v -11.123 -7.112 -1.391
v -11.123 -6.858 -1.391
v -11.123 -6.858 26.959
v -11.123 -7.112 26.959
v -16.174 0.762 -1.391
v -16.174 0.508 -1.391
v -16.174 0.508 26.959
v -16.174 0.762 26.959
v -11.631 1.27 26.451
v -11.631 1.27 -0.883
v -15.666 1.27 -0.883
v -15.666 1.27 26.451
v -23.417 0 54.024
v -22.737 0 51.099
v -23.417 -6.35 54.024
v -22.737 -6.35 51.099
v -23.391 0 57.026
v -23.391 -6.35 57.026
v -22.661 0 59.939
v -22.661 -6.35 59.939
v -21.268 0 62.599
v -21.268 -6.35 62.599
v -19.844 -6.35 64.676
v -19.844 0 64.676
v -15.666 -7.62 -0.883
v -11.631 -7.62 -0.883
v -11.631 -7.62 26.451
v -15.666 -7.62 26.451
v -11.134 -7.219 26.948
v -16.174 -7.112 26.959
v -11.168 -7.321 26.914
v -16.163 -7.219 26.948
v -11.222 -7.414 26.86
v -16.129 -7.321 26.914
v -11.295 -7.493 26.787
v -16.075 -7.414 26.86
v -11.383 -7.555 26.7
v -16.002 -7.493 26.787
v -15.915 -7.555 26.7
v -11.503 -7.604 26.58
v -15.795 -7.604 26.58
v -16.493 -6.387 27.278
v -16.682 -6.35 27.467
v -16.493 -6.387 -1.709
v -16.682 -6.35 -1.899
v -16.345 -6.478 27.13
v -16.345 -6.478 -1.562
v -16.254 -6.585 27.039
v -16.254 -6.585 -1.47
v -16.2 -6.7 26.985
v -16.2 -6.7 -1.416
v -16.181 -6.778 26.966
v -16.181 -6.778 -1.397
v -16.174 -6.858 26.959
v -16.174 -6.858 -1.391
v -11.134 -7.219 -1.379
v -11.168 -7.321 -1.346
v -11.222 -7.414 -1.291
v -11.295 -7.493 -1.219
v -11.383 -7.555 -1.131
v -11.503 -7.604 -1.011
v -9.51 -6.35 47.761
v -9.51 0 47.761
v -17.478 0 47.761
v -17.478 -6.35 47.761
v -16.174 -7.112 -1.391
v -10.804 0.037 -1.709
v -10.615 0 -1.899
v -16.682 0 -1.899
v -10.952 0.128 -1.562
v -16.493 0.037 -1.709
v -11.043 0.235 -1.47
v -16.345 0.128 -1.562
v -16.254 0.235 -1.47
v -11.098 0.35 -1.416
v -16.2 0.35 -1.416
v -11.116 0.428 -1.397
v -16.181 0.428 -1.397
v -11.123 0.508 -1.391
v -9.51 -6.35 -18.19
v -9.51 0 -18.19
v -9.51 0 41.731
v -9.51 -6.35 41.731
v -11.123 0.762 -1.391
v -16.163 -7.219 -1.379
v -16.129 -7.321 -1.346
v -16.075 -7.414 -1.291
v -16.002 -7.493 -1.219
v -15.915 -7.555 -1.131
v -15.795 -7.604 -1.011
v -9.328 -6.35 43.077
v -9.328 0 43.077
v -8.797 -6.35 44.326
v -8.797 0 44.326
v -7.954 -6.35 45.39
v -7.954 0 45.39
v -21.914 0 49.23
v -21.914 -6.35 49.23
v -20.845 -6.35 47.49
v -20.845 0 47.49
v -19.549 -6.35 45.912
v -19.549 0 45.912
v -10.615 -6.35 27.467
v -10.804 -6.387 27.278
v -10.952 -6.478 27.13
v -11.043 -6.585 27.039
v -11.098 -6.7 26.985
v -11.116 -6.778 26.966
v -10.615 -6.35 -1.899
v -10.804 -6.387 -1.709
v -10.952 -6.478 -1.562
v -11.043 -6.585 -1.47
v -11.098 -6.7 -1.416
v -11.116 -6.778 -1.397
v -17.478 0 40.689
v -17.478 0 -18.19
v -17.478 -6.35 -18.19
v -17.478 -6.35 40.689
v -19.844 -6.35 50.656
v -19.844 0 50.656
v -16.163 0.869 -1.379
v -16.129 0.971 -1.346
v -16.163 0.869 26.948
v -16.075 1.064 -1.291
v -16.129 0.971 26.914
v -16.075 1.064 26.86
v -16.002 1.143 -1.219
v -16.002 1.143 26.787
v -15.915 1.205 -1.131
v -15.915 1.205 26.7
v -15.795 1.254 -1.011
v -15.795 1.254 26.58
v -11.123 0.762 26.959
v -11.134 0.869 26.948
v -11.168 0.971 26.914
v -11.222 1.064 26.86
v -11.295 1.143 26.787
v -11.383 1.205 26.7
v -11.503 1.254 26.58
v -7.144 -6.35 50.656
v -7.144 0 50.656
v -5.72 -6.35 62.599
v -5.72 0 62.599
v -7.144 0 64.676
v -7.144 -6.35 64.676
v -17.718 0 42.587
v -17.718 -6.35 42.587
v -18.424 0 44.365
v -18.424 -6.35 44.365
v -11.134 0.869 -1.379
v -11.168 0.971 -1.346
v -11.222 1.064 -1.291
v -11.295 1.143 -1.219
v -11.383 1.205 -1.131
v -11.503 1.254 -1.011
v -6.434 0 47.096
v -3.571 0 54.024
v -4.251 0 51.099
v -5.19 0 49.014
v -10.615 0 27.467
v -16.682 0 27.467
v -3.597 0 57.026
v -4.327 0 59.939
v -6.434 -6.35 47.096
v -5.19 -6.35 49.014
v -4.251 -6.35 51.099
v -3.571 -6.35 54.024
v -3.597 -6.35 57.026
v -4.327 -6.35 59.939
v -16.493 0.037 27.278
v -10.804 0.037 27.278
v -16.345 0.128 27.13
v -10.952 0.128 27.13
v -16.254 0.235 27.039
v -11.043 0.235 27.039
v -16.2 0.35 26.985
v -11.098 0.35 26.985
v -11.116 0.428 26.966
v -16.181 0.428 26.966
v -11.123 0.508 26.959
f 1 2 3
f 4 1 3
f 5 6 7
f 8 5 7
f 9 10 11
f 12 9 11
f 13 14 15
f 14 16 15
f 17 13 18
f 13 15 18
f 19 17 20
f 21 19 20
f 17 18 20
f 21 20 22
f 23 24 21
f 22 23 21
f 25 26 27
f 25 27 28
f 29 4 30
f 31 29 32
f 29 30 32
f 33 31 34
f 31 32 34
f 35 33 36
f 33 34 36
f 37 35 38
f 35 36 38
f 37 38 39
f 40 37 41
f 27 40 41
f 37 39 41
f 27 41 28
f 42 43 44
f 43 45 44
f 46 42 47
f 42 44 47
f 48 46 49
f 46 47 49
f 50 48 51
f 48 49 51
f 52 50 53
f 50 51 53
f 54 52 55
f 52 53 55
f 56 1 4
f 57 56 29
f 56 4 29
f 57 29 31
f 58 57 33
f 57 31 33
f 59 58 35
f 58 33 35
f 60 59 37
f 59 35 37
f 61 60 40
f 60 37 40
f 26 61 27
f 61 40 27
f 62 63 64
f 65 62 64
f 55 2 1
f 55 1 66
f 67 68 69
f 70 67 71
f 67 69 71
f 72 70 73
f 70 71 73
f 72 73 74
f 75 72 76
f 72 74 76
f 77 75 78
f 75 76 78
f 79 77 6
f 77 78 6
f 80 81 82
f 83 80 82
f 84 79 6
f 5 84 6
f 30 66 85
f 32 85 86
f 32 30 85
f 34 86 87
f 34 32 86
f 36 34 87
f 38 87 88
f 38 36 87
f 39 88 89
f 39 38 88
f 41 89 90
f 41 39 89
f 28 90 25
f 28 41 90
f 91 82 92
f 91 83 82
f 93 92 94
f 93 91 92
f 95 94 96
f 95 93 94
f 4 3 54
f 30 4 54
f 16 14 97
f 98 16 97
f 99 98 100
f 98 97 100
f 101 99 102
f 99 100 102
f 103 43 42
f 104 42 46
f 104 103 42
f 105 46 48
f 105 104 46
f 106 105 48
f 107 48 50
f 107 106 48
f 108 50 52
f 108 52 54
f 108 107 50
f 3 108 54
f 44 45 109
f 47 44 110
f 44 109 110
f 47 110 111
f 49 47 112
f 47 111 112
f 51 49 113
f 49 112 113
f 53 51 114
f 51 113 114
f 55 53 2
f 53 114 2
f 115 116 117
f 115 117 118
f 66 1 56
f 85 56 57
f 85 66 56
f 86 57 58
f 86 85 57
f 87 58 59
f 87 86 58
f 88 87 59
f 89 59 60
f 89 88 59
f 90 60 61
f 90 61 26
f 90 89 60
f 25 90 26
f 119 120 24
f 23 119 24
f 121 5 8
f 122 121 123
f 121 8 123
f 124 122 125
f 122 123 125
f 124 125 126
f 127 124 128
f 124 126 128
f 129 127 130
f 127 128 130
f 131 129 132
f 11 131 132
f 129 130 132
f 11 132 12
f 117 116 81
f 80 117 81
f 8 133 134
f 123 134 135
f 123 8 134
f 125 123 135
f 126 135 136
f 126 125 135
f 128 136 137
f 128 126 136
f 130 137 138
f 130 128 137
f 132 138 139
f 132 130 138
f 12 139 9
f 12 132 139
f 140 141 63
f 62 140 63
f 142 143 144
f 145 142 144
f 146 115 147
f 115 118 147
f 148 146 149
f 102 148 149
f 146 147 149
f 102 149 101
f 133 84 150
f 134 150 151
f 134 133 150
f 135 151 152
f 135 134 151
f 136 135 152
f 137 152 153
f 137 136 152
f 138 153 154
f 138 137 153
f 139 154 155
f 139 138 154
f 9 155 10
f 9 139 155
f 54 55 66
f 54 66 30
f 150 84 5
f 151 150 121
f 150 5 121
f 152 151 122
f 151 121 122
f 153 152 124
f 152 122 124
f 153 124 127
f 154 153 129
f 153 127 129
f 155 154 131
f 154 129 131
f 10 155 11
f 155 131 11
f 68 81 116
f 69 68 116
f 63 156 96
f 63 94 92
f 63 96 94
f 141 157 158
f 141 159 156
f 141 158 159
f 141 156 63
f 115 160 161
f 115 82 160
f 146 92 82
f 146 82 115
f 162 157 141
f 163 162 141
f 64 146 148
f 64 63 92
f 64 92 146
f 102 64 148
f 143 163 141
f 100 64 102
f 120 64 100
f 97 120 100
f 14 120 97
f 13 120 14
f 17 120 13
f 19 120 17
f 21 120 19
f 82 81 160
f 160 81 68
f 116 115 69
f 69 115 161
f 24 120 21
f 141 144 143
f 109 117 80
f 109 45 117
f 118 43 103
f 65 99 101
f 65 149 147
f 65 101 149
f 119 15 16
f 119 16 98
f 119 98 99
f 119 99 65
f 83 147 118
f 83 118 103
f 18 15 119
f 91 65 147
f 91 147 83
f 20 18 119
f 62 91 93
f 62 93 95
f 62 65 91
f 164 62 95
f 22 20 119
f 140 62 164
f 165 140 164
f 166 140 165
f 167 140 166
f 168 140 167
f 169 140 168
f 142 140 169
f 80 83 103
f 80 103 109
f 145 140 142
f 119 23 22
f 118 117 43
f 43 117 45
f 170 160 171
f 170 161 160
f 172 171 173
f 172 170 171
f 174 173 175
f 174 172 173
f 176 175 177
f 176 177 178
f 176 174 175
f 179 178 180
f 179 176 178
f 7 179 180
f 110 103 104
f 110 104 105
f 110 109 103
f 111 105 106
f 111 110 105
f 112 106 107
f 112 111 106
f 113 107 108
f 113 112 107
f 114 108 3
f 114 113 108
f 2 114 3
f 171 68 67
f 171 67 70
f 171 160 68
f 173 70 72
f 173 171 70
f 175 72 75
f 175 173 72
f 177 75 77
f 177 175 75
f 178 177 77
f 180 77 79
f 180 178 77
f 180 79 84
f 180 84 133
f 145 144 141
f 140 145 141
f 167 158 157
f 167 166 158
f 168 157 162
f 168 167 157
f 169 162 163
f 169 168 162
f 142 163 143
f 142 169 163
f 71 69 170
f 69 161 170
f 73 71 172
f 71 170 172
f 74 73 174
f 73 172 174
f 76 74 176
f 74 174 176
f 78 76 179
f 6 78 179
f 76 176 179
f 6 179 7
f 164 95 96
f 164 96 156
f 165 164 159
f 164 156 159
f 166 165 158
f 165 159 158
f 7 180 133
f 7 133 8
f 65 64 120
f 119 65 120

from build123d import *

# Parameters (mm, degrees)
F0_W          = 7.9684891073
F0_H          = 62.2722776352
F1_DEPTH      = 6.35
F2_R          = 7.62
F3_R          = 12.7
F4_W          = 5.0514815375
F4_H          = 28.3501516096
F5_DEPTH      = 7.62
F5_DEPTH_BACK = 1.27
F6_R          = 0.508
F7_R          = 0.508
F8_R          = 0.508
F9_R          = 5.08


with BuildPart() as f1:
    # F0 (on Front) → F1 (new body)
    with BuildSketch(Plane.XZ):
        with Locations((-13.4939518757, 12.9458873377)):
            Rectangle(F0_W, F0_H)
        with BuildLine():
            ThreePointArc((-23.2001595007, 59.7813798143), (-22.7239205368, 51.0625328759), (-17.4781964294, 44.0820261553))
            Line((-17.4781964294, 44.0820261553), (-9.5097073221, 44.0820261553))
            ThreePointArc((-9.5097073221, 44.0820261553), (-4.2639832147, 51.0625328759), (-3.7877442507, 59.7813798143))
            Line((-3.7877442507, 59.7813798143), (-7.1439518757, 59.7813798143))
            Line((-7.1439518757, 59.7813798143), (-7.1439518757, 50.6561658404))
            Line((-7.1439518757, 50.6561658404), (-9.5097073221, 47.7606636927))
            Line((-9.5097073221, 47.7606636927), (-17.4781964294, 47.7606636927))
            Line((-17.4781964294, 47.7606636927), (-19.8439518757, 50.6561658404))
            Line((-19.8439518757, 50.6561658404), (-19.8439518757, 59.7813798143))
            Line((-19.8439518757, 59.7813798143), (-23.2001595007, 59.7813798143))
        make_face()
        Polygon((-19.8439518757, 64.6756440401), (-23.2001595007, 59.7813798143), (-19.8439518757, 59.7813798143), align=None)
        Polygon((-7.1439518757, 59.7813798143), (-3.7877442507, 59.7813798143), (-7.1439518757, 64.6756440401), align=None)
    extrude(amount=F1_DEPTH)

    # F2
    f2_edges = [f1.edges().sort_by_distance(p)[0] for p in [
        (-17.478196, -3.175, 44.082026),
    ]]
    fillet(f2_edges, radius=F2_R)

    # F3
    f3_edges = [f1.edges().sort_by_distance(p)[0] for p in [
        (-3.787744, -3.175, 59.78138),
        (-23.20016, -3.175, 59.78138),
    ]]
    fillet(f3_edges, radius=F3_R)

    # F4 (on face) → F5 (join, two sides)
    with BuildSketch(Plane(origin=(0, 0, 0), x_dir=(-1, 0, 0), z_dir=(0, 1, 0))) as f5_sk:
        with Locations((13.6485905387, 12.7843844239)):
            Rectangle(F4_W, F4_H)
    extrude(amount=-F5_DEPTH)
    extrude(f5_sk.sketch, amount=F5_DEPTH_BACK)

    # F6
    f6_edges = [f1.edges().sort_by_distance(p)[0] for p in [
        (-11.12285, 0, 12.784384),
        (-13.648591, 0, -1.390691),
        (-13.648591, 0, 26.95946),
        (-16.174331, 0, 12.784384),
    ]]
    fillet(f6_edges, radius=F6_R)

    # F7
    f7_edges = [f1.edges().sort_by_distance(p)[0] for p in [
        (-11.12285, 1.27, 12.784384),
        (-13.648591, 1.27, -1.390691),
        (-16.174331, 1.27, 12.784384),
        (-13.648591, 1.27, 26.95946),
    ]]
    fillet(f7_edges, radius=F7_R)

    # F8
    f8_edges = [f1.edges().sort_by_distance(p)[0] for p in [
        (-13.648591, -6.35, -1.390691),
        (-11.12285, -6.35, 12.784384),
        (-13.648591, -6.35, 26.95946),
        (-16.174331, -6.35, 12.784384),
        (-11.12285, -7.62, 12.784384),
        (-13.648591, -7.62, -1.390691),
        (-16.174331, -7.62, 12.784384),
        (-13.648591, -7.62, 26.95946),
    ]]
    fillet(f8_edges, radius=F8_R)

    # F9
    f9_edges = [f1.edges().sort_by_distance(p)[0] for p in [
        (-9.509707, -3.175, 44.082026),
    ]]
    fillet(f9_edges, radius=F9_R)


solid = f1.part
